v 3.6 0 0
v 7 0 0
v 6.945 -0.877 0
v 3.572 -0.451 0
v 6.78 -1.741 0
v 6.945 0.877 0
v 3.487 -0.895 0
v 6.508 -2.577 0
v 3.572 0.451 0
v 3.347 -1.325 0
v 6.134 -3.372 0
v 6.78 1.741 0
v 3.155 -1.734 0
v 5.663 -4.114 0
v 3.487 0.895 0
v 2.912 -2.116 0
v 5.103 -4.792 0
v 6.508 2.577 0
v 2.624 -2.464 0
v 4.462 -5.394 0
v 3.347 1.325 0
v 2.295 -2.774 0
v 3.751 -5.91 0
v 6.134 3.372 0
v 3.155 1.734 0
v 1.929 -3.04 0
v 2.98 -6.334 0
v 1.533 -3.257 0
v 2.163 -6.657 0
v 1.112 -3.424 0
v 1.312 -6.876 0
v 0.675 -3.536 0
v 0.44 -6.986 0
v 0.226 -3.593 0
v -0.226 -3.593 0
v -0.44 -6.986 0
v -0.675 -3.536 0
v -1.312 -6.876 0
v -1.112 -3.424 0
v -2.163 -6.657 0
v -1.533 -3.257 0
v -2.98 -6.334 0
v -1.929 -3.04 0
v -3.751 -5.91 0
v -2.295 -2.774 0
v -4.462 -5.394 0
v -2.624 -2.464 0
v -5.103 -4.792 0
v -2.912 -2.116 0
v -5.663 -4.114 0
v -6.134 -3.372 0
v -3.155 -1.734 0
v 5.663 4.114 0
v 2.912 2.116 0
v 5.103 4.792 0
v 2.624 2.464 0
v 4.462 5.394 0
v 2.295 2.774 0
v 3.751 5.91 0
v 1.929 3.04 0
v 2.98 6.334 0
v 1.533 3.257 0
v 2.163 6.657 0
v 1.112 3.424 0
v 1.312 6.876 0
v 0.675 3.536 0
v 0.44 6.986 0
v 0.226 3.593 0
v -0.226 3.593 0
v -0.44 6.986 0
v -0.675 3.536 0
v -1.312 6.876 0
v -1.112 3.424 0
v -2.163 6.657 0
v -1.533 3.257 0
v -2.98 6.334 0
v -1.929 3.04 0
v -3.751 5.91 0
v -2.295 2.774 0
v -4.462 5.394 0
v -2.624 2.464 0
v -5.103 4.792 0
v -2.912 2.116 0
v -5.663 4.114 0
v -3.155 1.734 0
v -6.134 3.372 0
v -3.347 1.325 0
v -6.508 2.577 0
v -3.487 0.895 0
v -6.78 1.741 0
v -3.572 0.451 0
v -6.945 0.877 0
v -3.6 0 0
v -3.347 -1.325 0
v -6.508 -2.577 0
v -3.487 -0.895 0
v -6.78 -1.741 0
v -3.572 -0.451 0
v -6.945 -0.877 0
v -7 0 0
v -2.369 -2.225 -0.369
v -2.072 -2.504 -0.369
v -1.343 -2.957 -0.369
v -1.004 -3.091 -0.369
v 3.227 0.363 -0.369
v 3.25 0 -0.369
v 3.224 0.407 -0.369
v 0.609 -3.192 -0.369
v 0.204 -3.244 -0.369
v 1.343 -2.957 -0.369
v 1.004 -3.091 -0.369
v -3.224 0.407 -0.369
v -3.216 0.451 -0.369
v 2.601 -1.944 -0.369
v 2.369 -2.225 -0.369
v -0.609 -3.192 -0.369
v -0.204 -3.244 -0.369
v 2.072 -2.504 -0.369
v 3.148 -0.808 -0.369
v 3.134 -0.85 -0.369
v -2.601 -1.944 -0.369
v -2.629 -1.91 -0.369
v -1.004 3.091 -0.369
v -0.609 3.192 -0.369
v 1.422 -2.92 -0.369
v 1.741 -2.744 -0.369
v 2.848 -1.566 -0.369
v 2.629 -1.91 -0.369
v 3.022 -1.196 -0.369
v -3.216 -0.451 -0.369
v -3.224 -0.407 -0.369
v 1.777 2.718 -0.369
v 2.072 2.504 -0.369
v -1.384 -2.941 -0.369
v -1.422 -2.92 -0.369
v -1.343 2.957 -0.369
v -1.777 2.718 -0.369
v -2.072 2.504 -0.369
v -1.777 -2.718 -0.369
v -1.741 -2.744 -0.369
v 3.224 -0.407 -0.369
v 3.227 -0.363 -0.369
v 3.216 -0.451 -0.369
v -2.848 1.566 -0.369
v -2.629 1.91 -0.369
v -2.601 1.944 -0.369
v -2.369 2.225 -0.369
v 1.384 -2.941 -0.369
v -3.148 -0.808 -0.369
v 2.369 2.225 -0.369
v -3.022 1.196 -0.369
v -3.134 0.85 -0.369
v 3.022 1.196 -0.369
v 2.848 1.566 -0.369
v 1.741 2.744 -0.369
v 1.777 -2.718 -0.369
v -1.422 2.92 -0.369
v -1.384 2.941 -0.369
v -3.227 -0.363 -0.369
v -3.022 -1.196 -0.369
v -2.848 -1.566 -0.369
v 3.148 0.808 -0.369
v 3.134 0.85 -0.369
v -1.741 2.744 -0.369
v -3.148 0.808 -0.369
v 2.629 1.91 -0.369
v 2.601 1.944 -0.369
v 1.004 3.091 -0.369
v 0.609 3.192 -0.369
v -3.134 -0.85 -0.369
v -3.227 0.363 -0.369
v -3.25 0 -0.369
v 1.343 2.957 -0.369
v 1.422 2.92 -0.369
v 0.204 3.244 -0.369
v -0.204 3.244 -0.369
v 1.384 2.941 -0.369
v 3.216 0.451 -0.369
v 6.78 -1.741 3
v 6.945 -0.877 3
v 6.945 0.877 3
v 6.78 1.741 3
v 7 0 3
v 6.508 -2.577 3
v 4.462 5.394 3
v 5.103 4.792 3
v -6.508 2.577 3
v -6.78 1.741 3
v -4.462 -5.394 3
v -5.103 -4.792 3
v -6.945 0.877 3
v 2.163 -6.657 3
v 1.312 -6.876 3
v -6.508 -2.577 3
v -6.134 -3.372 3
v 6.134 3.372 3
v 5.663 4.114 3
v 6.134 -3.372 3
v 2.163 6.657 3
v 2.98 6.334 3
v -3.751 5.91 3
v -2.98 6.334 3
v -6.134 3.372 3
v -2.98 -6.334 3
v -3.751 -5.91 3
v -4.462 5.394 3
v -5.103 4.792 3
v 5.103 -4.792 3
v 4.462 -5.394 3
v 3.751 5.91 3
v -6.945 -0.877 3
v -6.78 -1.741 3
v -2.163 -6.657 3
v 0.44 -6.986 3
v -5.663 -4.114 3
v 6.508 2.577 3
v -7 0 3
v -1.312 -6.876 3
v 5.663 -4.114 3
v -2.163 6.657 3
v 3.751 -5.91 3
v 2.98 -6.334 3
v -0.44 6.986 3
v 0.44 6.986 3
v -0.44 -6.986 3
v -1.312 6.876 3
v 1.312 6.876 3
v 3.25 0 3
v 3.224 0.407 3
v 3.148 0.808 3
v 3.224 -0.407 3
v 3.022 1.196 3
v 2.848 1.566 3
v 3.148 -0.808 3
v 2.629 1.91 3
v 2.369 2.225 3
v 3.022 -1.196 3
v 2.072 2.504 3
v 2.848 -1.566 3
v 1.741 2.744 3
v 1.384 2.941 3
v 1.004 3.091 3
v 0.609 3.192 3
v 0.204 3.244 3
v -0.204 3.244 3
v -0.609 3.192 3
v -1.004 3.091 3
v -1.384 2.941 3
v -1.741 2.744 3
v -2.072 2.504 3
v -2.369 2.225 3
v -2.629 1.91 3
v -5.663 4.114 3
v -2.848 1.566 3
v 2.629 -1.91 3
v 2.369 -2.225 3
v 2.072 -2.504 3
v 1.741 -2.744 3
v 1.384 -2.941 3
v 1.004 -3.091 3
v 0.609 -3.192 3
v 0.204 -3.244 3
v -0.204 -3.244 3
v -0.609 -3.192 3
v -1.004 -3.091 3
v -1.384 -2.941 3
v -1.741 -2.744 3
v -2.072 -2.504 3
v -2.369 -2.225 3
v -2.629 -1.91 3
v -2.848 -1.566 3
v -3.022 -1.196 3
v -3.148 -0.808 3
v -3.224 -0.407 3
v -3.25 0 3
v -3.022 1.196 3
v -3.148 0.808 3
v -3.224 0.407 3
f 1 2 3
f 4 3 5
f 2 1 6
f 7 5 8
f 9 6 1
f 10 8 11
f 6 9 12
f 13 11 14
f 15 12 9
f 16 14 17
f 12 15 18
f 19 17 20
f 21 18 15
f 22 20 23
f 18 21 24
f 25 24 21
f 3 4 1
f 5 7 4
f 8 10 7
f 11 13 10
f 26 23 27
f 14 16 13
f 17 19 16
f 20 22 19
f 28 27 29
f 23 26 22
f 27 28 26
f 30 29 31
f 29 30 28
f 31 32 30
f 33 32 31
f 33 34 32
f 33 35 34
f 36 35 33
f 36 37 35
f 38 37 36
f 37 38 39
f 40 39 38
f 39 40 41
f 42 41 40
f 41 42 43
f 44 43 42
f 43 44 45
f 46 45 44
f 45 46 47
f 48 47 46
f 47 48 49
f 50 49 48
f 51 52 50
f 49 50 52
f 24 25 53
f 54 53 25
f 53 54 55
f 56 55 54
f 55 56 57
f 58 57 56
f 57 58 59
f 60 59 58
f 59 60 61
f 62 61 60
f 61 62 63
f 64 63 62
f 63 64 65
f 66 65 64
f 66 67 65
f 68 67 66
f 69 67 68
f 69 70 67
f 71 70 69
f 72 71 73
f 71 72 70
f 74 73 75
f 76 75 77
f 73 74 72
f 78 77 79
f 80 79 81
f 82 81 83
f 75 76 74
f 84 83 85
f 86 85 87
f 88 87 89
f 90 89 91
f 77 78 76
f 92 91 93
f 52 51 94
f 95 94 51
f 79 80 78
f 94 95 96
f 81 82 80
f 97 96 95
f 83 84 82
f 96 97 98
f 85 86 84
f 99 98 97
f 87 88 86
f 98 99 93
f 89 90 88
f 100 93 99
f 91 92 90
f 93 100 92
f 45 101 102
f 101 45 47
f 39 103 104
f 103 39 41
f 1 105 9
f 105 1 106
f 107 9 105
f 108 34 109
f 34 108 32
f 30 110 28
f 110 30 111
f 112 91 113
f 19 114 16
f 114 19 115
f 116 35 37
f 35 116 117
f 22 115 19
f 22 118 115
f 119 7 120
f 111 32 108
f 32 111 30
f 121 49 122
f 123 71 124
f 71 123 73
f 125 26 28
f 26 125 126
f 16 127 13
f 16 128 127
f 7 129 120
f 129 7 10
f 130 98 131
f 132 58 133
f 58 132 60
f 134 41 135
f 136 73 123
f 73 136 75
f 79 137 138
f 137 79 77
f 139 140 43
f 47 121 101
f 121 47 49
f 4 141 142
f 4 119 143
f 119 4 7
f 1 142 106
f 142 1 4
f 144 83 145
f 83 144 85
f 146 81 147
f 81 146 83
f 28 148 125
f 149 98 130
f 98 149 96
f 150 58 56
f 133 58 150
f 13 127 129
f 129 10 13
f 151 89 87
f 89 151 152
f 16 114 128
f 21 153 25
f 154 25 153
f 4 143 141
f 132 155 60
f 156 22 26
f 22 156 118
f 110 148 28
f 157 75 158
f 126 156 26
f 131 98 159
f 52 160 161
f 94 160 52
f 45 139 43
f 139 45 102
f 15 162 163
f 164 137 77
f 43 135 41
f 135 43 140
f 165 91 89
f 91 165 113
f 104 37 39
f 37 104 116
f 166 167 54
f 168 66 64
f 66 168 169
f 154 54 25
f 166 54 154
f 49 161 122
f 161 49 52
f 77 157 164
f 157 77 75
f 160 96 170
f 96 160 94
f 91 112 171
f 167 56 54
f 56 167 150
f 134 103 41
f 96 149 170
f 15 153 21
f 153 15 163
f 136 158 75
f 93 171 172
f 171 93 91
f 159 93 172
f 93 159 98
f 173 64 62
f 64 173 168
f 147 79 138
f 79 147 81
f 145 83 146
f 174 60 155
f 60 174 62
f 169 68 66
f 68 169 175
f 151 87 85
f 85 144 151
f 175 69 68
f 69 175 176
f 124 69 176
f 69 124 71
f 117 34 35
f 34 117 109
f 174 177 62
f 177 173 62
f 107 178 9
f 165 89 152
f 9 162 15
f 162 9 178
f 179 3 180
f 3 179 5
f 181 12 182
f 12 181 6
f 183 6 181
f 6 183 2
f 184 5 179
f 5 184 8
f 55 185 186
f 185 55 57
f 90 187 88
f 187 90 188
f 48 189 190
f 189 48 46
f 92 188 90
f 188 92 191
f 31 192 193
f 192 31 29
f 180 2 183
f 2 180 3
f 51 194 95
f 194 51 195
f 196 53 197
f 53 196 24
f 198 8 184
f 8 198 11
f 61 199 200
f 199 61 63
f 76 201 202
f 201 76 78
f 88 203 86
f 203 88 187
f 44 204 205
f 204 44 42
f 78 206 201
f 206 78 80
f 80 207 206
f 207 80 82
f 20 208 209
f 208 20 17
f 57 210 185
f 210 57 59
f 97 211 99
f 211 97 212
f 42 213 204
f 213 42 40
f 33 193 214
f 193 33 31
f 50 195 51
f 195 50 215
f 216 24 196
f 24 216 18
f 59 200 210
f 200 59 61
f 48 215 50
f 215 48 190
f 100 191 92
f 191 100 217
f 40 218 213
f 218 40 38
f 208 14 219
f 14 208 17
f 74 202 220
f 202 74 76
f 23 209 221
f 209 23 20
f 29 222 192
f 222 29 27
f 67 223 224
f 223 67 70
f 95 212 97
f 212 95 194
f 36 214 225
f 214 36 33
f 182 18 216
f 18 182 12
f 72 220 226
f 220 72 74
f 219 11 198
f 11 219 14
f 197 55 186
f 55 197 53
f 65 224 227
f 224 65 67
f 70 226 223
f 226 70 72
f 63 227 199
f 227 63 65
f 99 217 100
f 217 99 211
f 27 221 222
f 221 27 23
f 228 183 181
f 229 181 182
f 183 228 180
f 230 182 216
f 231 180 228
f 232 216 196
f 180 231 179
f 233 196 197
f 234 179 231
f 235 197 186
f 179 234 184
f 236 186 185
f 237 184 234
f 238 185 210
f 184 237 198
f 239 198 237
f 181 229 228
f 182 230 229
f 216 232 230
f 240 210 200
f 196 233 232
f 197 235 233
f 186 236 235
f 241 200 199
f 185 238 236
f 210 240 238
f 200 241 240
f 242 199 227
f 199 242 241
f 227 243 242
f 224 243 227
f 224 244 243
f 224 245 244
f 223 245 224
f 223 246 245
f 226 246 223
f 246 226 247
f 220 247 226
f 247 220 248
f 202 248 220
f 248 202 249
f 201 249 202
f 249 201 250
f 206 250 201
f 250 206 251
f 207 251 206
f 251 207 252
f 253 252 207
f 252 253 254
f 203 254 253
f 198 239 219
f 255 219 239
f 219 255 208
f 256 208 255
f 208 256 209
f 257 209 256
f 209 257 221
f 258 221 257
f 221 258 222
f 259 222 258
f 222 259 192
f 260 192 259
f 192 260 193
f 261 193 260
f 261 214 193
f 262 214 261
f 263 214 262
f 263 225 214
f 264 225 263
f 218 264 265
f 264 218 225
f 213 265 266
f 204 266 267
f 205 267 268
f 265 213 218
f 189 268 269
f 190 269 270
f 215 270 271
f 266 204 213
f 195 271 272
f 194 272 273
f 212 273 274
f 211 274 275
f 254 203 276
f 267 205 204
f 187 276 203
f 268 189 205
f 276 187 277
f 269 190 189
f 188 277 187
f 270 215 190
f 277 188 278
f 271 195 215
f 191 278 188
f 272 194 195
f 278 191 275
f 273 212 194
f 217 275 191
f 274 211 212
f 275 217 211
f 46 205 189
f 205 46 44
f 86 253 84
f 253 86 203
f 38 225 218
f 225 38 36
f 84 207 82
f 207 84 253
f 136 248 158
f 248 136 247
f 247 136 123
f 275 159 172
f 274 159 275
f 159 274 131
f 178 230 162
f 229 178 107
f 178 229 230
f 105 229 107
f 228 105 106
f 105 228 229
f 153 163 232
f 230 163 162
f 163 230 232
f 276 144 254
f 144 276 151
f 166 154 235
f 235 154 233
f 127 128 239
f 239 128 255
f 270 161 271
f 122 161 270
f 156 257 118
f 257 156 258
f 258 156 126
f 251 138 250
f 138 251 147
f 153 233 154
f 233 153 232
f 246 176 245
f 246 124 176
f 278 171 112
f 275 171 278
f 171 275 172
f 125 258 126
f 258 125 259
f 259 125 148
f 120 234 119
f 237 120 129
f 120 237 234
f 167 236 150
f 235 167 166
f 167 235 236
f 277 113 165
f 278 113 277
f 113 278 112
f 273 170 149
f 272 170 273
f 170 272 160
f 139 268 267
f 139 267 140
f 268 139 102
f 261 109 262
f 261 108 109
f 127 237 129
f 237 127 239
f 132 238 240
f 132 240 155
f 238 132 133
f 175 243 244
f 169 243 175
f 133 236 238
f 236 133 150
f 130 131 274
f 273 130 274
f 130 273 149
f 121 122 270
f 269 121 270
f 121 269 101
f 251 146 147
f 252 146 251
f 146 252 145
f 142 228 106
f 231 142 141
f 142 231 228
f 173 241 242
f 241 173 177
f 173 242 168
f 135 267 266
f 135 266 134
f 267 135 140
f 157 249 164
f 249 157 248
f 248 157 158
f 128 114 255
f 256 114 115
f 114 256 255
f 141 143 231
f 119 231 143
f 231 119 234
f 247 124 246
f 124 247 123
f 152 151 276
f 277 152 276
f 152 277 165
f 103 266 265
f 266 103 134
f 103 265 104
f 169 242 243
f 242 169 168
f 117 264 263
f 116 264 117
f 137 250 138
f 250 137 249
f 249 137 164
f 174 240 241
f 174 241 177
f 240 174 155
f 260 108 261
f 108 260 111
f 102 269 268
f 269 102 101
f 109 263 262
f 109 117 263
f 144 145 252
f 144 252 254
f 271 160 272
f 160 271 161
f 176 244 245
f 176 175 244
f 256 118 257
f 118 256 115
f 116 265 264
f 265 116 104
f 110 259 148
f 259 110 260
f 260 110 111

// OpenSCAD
$fn = 50;

difference() {
	union() {
		translate(v = [0, 0, 0]) {
			rotate(a = [0, 0, 0]) {
				difference() {
					union() {
						#translate(v = [0, 0, -3.0]) {
							cylinder(h = 3, r = 1.5);
						}
						#translate(v = [0, 0, -1.9]) {
							cylinder(h = 1.9, r1 = 1.8, r2 = 3.6);
						}
						#translate(v = [0, 0, -3.0]) {
							cylinder(h = 3, r = 1.8);
						}
						#translate(v = [0, 0, -3.0]) {
							cylinder(h = 3, r = 1.5);
						}
					}
					union();
				}
			}
		}
		cylinder(h = 3, r = 7.0);
	}
	union() {
		translate(v = [0.0, 0.0, -100.0]) {
			cylinder(h = 200, r = 3.25);
		}
	}
}
